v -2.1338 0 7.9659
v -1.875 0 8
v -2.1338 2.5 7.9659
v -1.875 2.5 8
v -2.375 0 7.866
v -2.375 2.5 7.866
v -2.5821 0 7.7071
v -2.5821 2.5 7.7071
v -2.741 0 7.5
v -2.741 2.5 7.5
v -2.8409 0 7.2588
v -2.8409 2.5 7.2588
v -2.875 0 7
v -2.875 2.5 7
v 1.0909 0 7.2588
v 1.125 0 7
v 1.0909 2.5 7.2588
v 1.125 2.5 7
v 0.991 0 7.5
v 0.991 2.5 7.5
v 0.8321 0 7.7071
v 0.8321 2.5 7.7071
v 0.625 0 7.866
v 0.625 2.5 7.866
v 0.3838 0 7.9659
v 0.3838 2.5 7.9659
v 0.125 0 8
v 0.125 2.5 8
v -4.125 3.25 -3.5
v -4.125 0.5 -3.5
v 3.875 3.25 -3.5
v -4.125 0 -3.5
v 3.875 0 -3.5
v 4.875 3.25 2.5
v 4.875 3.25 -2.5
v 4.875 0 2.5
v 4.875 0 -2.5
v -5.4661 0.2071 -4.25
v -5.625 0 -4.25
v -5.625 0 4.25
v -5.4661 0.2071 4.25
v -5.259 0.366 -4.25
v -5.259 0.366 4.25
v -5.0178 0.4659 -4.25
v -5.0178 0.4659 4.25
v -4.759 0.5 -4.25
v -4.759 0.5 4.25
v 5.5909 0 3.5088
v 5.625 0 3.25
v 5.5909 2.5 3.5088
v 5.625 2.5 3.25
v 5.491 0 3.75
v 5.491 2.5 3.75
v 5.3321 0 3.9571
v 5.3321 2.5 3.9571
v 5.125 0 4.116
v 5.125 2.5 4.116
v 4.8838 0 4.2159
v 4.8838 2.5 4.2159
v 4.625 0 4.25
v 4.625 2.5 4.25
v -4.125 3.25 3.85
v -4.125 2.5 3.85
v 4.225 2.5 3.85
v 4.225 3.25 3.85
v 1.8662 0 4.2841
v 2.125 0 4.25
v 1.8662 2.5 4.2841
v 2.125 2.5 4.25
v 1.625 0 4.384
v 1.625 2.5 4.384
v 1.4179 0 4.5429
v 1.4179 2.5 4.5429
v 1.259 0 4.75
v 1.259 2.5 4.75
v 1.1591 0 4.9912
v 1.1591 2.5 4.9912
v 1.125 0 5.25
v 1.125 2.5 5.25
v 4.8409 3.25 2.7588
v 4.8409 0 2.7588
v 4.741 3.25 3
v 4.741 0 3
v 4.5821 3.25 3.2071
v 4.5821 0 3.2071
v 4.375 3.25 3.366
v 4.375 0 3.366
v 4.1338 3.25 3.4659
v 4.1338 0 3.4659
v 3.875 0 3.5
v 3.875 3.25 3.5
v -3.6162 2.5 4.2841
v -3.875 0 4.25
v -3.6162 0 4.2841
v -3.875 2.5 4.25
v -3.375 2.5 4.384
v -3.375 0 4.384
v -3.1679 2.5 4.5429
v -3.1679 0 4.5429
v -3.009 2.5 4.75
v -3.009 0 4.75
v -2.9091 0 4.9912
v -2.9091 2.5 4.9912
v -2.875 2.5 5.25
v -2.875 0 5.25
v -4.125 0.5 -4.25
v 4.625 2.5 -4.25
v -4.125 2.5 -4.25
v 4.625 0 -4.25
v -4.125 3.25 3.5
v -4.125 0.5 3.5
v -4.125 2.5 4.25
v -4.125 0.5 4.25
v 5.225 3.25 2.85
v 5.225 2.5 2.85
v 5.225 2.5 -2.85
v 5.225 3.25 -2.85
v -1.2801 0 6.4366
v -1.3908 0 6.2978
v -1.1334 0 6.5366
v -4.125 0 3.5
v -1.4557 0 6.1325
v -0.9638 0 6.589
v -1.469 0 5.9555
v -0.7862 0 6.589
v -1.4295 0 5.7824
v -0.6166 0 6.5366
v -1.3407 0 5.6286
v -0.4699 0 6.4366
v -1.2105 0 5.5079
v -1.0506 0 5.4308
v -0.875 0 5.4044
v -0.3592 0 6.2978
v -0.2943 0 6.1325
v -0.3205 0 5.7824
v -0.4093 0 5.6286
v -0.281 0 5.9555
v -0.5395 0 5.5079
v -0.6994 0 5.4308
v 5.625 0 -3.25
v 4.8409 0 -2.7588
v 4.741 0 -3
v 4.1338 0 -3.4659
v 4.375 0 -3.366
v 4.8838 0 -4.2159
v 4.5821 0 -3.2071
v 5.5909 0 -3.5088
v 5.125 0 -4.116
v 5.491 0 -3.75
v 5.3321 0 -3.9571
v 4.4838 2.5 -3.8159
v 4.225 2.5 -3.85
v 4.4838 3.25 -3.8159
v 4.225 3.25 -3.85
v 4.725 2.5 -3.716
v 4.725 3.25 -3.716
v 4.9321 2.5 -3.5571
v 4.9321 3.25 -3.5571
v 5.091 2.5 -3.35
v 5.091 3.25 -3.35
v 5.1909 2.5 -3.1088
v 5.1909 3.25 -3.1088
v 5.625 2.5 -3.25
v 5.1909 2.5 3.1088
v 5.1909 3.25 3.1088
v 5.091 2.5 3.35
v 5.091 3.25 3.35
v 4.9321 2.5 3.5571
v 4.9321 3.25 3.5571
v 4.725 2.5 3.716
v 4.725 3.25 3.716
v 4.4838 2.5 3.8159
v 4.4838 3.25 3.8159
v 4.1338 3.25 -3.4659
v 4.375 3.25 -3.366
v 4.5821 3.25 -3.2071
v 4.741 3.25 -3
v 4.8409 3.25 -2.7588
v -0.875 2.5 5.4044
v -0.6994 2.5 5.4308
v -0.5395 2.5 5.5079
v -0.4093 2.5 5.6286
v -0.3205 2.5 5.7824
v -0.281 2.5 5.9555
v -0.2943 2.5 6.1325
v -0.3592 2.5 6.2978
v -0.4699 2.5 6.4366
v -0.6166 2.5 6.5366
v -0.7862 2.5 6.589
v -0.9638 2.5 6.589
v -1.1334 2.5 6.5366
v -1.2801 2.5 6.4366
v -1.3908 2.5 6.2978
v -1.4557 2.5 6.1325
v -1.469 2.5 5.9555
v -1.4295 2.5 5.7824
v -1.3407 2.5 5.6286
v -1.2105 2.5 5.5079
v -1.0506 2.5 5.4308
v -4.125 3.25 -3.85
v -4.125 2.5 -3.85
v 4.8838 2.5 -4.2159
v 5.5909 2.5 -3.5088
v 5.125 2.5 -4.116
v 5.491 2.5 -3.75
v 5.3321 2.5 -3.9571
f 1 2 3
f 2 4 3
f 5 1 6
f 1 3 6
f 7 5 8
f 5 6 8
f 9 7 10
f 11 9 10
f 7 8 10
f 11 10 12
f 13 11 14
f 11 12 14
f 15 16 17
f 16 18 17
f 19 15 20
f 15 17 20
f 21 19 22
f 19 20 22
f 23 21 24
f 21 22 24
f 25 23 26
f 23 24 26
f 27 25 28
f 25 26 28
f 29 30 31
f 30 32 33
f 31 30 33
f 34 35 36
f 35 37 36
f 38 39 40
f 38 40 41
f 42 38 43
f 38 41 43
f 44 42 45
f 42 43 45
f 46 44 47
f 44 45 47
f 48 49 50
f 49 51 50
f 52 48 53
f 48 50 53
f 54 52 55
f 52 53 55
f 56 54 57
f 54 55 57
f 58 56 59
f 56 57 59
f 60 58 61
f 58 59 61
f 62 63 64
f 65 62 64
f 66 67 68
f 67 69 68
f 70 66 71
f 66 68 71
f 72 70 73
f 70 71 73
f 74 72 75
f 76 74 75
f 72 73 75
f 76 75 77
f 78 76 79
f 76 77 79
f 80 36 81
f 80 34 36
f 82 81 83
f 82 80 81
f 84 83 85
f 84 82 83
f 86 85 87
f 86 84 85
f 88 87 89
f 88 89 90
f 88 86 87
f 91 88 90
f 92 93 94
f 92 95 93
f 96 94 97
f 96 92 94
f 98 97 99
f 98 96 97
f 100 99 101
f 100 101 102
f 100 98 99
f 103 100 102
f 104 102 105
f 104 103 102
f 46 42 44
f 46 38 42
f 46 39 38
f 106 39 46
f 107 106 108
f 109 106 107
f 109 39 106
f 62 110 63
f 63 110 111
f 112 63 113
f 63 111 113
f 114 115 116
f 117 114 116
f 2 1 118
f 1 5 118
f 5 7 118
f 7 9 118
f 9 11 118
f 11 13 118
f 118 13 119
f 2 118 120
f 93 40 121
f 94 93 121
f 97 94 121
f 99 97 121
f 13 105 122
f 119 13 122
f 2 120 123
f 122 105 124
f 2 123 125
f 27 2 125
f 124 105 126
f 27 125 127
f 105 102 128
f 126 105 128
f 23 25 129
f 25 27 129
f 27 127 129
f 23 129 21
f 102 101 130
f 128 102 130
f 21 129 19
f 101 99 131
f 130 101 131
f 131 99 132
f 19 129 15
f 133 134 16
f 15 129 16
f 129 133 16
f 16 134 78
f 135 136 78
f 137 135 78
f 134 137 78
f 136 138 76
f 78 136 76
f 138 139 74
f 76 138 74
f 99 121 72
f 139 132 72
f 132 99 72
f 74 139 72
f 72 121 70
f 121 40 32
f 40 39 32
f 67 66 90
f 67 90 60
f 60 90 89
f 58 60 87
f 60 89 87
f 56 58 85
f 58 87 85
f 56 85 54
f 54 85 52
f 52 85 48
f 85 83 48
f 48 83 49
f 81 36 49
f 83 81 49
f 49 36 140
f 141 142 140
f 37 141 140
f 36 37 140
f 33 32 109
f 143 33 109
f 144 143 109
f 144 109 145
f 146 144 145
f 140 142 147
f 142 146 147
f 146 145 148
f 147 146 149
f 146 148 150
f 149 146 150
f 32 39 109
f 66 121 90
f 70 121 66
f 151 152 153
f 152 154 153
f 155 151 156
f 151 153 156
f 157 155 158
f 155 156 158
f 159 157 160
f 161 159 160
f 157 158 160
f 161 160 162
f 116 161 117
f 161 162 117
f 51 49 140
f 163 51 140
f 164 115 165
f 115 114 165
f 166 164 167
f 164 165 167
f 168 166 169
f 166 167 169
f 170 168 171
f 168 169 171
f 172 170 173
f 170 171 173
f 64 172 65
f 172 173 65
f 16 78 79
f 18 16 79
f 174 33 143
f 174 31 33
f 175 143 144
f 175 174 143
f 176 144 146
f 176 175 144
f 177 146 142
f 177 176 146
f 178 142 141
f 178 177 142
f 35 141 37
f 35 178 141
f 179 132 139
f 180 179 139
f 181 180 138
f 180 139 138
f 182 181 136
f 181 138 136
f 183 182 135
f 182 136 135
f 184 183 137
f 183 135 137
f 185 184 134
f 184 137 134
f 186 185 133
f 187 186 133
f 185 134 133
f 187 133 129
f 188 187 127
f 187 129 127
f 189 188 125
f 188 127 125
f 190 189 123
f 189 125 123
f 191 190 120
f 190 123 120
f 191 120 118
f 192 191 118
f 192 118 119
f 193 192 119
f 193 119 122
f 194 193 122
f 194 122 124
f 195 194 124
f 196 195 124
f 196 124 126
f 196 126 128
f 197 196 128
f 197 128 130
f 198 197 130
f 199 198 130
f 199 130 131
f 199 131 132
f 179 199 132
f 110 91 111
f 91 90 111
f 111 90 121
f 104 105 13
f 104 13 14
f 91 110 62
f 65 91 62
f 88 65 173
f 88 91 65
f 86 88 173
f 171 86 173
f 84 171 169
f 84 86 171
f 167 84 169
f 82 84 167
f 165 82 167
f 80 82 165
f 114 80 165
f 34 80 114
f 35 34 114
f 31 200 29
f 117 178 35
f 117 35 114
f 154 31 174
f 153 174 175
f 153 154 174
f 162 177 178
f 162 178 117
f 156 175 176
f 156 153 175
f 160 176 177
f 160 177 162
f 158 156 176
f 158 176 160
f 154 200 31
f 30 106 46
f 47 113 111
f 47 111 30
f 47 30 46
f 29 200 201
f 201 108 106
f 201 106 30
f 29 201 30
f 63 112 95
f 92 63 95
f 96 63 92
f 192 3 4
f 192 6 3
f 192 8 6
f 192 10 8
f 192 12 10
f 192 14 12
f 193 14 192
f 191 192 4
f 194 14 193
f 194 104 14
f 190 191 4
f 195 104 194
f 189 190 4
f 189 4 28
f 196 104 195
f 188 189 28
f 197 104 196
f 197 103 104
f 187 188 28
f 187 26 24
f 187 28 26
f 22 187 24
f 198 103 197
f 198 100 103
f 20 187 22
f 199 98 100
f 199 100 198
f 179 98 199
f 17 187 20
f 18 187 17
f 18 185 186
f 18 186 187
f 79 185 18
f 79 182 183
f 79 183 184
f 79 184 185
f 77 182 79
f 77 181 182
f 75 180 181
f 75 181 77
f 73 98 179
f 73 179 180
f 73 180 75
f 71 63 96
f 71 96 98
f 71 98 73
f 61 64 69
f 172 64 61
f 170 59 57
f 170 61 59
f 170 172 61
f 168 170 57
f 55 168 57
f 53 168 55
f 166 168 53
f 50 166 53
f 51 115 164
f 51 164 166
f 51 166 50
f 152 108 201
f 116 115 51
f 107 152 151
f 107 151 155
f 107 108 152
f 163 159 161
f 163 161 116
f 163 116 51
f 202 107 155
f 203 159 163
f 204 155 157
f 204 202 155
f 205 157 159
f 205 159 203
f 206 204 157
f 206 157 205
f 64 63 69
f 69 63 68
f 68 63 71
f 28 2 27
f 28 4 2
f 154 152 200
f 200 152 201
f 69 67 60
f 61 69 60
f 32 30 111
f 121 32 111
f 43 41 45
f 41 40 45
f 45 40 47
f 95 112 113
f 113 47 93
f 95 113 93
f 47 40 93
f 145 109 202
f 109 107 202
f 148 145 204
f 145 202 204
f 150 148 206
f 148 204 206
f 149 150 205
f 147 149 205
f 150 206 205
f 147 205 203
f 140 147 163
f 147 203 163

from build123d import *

# Parameters (mm, degrees)
SKETCH5_W                 = 11.25
SKETCH5_H                 = 8.5
EXTRUDE4_DEPTH            = 2.5
SKETCH19_W                = 1.5
SKETCH19_H                = 8.5
EXTRUDE12_DEPTH           = 2
SKETCH21_W                = 9
SKETCH21_H                = 7
EXTRUDE13_DEPTH           = 8.48018215
SKETCH22_W                = 4
SKETCH22_H                = 2.5
EXTRUDE14_DEPTH           = 3.75
EXTRUDE15_DEPTH           = 0.75
F_0_80_TAPPED_HOLE1_D     = 1.19126
F_0_80_TAPPED_HOLE1_DEPTH = 79.01
F_0_80_TAPPED_HOLE1_TIP   = 0.357890611
FILLET4_R                 = 1
FILLET5_R                 = 1


with BuildPart() as part:
    # Sketch5 → Extrude4 (new body)
    with BuildSketch(Plane(origin=(0, 0, 0), x_dir=(1, 0, 0), z_dir=(0, 1, 0))):
        Rectangle(SKETCH5_W, SKETCH5_H)
    extrude(amount=EXTRUDE4_DEPTH)

    # Sketch19 → Extrude12 (cut)
    with BuildSketch(Plane(origin=(0, 2.5, 0), x_dir=(-1, 0, 0), z_dir=(0, 1, 0))):
        with Locations((4.875, 0)):
            Rectangle(SKETCH19_W, SKETCH19_H)
    extrude(amount=-EXTRUDE12_DEPTH, mode=Mode.SUBTRACT)

    # Sketch21 → Extrude13 (cut, through all)
    with BuildSketch(Plane(origin=(0, 2.5, 0), x_dir=(-1, 0, 0), z_dir=(0, 1, 0))):
        with Locations((-0.375, 0)):
            Rectangle(SKETCH21_W, SKETCH21_H)
    extrude(amount=-EXTRUDE13_DEPTH, mode=Mode.SUBTRACT)

    # Sketch22 → Extrude14 (add)
    with BuildSketch(Plane.XY.offset(4.25)):
        with Locations((-0.875, 1.25)):
            Rectangle(SKETCH22_W, SKETCH22_H)
    extrude(amount=EXTRUDE14_DEPTH)

    # Sketch24 → Extrude15 (add)
    with BuildSketch(Plane(origin=(0, 2.5, 0), x_dir=(1, 0, 0), z_dir=(0, 1, 0))):
        Polygon((-4.125, 3.85), (-4.125, 3.5), (4.875, 3.5), (4.875, -3.5), (-4.125, -3.5), (-4.125, -3.85), (5.225, -3.85), (5.225, 3.85), align=None)
    extrude(amount=EXTRUDE15_DEPTH)

    # #0-80 Tapped Hole1
    with Locations(Plane(origin=(-0.875, 2.5, 6), x_dir=(0, 0, 1), z_dir=(0, 1, 0))):
        with Locations((0, 0)):
            Hole(F_0_80_TAPPED_HOLE1_D / 2, depth=F_0_80_TAPPED_HOLE1_DEPTH)
            with Locations((0, 0, -(F_0_80_TAPPED_HOLE1_DEPTH + F_0_80_TAPPED_HOLE1_TIP / 2))):  # 118° drill point
                Cone(0, F_0_80_TAPPED_HOLE1_D / 2, F_0_80_TAPPED_HOLE1_TIP, mode=Mode.SUBTRACT)

    # Fillet4
    fillet4_edges = [part.edges().sort_by_distance(p)[0] for p in [
        (5.625, 1.25, -4.25),
        (5.225, 2.875, -3.85),
        (5.625, 1.25, 4.25),
        (5.225, 2.875, 3.85),
        (-2.875, 1.25, 8),
        (1.125, 1.25, 8),
        (1.125, 1.25, 4.25),
        (-2.875, 1.25, 4.25),
        (4.875, 1.625, 3.5),
        (4.875, 1.625, -3.5),
    ]]
    fillet(fillet4_edges, radius=FILLET4_R)

    # Fillet5
    # the kernel refuses this fillet: 1 mm, written as the material it takes off along each edge
    with BuildSketch(Plane(origin=(-5.625, 0.5, 6.415063509), x_dir=(0, -1, 0), z_dir=(0, 0, -1))) as fillet5_piece_1:
        with BuildLine():
            CenterArc((1, -0.866025404), FILLET5_R, 120, 60)
            Line((0, -0.866025404), (-0.02, -0.866025404))
            Line((-0.02, -0.866025404), (-0.02, 0))
            Line((-0.02, 0), (0, 0.02))
            ThreePointArc((0, 0.02), (0.25, 0.02), (0.49, 0.017320508))
            Line((0.49, 0.017320508), (0.5, 0))
        make_face()
    extrude(amount=12.830127019, mode=Mode.SUBTRACT)


solid = part.part
